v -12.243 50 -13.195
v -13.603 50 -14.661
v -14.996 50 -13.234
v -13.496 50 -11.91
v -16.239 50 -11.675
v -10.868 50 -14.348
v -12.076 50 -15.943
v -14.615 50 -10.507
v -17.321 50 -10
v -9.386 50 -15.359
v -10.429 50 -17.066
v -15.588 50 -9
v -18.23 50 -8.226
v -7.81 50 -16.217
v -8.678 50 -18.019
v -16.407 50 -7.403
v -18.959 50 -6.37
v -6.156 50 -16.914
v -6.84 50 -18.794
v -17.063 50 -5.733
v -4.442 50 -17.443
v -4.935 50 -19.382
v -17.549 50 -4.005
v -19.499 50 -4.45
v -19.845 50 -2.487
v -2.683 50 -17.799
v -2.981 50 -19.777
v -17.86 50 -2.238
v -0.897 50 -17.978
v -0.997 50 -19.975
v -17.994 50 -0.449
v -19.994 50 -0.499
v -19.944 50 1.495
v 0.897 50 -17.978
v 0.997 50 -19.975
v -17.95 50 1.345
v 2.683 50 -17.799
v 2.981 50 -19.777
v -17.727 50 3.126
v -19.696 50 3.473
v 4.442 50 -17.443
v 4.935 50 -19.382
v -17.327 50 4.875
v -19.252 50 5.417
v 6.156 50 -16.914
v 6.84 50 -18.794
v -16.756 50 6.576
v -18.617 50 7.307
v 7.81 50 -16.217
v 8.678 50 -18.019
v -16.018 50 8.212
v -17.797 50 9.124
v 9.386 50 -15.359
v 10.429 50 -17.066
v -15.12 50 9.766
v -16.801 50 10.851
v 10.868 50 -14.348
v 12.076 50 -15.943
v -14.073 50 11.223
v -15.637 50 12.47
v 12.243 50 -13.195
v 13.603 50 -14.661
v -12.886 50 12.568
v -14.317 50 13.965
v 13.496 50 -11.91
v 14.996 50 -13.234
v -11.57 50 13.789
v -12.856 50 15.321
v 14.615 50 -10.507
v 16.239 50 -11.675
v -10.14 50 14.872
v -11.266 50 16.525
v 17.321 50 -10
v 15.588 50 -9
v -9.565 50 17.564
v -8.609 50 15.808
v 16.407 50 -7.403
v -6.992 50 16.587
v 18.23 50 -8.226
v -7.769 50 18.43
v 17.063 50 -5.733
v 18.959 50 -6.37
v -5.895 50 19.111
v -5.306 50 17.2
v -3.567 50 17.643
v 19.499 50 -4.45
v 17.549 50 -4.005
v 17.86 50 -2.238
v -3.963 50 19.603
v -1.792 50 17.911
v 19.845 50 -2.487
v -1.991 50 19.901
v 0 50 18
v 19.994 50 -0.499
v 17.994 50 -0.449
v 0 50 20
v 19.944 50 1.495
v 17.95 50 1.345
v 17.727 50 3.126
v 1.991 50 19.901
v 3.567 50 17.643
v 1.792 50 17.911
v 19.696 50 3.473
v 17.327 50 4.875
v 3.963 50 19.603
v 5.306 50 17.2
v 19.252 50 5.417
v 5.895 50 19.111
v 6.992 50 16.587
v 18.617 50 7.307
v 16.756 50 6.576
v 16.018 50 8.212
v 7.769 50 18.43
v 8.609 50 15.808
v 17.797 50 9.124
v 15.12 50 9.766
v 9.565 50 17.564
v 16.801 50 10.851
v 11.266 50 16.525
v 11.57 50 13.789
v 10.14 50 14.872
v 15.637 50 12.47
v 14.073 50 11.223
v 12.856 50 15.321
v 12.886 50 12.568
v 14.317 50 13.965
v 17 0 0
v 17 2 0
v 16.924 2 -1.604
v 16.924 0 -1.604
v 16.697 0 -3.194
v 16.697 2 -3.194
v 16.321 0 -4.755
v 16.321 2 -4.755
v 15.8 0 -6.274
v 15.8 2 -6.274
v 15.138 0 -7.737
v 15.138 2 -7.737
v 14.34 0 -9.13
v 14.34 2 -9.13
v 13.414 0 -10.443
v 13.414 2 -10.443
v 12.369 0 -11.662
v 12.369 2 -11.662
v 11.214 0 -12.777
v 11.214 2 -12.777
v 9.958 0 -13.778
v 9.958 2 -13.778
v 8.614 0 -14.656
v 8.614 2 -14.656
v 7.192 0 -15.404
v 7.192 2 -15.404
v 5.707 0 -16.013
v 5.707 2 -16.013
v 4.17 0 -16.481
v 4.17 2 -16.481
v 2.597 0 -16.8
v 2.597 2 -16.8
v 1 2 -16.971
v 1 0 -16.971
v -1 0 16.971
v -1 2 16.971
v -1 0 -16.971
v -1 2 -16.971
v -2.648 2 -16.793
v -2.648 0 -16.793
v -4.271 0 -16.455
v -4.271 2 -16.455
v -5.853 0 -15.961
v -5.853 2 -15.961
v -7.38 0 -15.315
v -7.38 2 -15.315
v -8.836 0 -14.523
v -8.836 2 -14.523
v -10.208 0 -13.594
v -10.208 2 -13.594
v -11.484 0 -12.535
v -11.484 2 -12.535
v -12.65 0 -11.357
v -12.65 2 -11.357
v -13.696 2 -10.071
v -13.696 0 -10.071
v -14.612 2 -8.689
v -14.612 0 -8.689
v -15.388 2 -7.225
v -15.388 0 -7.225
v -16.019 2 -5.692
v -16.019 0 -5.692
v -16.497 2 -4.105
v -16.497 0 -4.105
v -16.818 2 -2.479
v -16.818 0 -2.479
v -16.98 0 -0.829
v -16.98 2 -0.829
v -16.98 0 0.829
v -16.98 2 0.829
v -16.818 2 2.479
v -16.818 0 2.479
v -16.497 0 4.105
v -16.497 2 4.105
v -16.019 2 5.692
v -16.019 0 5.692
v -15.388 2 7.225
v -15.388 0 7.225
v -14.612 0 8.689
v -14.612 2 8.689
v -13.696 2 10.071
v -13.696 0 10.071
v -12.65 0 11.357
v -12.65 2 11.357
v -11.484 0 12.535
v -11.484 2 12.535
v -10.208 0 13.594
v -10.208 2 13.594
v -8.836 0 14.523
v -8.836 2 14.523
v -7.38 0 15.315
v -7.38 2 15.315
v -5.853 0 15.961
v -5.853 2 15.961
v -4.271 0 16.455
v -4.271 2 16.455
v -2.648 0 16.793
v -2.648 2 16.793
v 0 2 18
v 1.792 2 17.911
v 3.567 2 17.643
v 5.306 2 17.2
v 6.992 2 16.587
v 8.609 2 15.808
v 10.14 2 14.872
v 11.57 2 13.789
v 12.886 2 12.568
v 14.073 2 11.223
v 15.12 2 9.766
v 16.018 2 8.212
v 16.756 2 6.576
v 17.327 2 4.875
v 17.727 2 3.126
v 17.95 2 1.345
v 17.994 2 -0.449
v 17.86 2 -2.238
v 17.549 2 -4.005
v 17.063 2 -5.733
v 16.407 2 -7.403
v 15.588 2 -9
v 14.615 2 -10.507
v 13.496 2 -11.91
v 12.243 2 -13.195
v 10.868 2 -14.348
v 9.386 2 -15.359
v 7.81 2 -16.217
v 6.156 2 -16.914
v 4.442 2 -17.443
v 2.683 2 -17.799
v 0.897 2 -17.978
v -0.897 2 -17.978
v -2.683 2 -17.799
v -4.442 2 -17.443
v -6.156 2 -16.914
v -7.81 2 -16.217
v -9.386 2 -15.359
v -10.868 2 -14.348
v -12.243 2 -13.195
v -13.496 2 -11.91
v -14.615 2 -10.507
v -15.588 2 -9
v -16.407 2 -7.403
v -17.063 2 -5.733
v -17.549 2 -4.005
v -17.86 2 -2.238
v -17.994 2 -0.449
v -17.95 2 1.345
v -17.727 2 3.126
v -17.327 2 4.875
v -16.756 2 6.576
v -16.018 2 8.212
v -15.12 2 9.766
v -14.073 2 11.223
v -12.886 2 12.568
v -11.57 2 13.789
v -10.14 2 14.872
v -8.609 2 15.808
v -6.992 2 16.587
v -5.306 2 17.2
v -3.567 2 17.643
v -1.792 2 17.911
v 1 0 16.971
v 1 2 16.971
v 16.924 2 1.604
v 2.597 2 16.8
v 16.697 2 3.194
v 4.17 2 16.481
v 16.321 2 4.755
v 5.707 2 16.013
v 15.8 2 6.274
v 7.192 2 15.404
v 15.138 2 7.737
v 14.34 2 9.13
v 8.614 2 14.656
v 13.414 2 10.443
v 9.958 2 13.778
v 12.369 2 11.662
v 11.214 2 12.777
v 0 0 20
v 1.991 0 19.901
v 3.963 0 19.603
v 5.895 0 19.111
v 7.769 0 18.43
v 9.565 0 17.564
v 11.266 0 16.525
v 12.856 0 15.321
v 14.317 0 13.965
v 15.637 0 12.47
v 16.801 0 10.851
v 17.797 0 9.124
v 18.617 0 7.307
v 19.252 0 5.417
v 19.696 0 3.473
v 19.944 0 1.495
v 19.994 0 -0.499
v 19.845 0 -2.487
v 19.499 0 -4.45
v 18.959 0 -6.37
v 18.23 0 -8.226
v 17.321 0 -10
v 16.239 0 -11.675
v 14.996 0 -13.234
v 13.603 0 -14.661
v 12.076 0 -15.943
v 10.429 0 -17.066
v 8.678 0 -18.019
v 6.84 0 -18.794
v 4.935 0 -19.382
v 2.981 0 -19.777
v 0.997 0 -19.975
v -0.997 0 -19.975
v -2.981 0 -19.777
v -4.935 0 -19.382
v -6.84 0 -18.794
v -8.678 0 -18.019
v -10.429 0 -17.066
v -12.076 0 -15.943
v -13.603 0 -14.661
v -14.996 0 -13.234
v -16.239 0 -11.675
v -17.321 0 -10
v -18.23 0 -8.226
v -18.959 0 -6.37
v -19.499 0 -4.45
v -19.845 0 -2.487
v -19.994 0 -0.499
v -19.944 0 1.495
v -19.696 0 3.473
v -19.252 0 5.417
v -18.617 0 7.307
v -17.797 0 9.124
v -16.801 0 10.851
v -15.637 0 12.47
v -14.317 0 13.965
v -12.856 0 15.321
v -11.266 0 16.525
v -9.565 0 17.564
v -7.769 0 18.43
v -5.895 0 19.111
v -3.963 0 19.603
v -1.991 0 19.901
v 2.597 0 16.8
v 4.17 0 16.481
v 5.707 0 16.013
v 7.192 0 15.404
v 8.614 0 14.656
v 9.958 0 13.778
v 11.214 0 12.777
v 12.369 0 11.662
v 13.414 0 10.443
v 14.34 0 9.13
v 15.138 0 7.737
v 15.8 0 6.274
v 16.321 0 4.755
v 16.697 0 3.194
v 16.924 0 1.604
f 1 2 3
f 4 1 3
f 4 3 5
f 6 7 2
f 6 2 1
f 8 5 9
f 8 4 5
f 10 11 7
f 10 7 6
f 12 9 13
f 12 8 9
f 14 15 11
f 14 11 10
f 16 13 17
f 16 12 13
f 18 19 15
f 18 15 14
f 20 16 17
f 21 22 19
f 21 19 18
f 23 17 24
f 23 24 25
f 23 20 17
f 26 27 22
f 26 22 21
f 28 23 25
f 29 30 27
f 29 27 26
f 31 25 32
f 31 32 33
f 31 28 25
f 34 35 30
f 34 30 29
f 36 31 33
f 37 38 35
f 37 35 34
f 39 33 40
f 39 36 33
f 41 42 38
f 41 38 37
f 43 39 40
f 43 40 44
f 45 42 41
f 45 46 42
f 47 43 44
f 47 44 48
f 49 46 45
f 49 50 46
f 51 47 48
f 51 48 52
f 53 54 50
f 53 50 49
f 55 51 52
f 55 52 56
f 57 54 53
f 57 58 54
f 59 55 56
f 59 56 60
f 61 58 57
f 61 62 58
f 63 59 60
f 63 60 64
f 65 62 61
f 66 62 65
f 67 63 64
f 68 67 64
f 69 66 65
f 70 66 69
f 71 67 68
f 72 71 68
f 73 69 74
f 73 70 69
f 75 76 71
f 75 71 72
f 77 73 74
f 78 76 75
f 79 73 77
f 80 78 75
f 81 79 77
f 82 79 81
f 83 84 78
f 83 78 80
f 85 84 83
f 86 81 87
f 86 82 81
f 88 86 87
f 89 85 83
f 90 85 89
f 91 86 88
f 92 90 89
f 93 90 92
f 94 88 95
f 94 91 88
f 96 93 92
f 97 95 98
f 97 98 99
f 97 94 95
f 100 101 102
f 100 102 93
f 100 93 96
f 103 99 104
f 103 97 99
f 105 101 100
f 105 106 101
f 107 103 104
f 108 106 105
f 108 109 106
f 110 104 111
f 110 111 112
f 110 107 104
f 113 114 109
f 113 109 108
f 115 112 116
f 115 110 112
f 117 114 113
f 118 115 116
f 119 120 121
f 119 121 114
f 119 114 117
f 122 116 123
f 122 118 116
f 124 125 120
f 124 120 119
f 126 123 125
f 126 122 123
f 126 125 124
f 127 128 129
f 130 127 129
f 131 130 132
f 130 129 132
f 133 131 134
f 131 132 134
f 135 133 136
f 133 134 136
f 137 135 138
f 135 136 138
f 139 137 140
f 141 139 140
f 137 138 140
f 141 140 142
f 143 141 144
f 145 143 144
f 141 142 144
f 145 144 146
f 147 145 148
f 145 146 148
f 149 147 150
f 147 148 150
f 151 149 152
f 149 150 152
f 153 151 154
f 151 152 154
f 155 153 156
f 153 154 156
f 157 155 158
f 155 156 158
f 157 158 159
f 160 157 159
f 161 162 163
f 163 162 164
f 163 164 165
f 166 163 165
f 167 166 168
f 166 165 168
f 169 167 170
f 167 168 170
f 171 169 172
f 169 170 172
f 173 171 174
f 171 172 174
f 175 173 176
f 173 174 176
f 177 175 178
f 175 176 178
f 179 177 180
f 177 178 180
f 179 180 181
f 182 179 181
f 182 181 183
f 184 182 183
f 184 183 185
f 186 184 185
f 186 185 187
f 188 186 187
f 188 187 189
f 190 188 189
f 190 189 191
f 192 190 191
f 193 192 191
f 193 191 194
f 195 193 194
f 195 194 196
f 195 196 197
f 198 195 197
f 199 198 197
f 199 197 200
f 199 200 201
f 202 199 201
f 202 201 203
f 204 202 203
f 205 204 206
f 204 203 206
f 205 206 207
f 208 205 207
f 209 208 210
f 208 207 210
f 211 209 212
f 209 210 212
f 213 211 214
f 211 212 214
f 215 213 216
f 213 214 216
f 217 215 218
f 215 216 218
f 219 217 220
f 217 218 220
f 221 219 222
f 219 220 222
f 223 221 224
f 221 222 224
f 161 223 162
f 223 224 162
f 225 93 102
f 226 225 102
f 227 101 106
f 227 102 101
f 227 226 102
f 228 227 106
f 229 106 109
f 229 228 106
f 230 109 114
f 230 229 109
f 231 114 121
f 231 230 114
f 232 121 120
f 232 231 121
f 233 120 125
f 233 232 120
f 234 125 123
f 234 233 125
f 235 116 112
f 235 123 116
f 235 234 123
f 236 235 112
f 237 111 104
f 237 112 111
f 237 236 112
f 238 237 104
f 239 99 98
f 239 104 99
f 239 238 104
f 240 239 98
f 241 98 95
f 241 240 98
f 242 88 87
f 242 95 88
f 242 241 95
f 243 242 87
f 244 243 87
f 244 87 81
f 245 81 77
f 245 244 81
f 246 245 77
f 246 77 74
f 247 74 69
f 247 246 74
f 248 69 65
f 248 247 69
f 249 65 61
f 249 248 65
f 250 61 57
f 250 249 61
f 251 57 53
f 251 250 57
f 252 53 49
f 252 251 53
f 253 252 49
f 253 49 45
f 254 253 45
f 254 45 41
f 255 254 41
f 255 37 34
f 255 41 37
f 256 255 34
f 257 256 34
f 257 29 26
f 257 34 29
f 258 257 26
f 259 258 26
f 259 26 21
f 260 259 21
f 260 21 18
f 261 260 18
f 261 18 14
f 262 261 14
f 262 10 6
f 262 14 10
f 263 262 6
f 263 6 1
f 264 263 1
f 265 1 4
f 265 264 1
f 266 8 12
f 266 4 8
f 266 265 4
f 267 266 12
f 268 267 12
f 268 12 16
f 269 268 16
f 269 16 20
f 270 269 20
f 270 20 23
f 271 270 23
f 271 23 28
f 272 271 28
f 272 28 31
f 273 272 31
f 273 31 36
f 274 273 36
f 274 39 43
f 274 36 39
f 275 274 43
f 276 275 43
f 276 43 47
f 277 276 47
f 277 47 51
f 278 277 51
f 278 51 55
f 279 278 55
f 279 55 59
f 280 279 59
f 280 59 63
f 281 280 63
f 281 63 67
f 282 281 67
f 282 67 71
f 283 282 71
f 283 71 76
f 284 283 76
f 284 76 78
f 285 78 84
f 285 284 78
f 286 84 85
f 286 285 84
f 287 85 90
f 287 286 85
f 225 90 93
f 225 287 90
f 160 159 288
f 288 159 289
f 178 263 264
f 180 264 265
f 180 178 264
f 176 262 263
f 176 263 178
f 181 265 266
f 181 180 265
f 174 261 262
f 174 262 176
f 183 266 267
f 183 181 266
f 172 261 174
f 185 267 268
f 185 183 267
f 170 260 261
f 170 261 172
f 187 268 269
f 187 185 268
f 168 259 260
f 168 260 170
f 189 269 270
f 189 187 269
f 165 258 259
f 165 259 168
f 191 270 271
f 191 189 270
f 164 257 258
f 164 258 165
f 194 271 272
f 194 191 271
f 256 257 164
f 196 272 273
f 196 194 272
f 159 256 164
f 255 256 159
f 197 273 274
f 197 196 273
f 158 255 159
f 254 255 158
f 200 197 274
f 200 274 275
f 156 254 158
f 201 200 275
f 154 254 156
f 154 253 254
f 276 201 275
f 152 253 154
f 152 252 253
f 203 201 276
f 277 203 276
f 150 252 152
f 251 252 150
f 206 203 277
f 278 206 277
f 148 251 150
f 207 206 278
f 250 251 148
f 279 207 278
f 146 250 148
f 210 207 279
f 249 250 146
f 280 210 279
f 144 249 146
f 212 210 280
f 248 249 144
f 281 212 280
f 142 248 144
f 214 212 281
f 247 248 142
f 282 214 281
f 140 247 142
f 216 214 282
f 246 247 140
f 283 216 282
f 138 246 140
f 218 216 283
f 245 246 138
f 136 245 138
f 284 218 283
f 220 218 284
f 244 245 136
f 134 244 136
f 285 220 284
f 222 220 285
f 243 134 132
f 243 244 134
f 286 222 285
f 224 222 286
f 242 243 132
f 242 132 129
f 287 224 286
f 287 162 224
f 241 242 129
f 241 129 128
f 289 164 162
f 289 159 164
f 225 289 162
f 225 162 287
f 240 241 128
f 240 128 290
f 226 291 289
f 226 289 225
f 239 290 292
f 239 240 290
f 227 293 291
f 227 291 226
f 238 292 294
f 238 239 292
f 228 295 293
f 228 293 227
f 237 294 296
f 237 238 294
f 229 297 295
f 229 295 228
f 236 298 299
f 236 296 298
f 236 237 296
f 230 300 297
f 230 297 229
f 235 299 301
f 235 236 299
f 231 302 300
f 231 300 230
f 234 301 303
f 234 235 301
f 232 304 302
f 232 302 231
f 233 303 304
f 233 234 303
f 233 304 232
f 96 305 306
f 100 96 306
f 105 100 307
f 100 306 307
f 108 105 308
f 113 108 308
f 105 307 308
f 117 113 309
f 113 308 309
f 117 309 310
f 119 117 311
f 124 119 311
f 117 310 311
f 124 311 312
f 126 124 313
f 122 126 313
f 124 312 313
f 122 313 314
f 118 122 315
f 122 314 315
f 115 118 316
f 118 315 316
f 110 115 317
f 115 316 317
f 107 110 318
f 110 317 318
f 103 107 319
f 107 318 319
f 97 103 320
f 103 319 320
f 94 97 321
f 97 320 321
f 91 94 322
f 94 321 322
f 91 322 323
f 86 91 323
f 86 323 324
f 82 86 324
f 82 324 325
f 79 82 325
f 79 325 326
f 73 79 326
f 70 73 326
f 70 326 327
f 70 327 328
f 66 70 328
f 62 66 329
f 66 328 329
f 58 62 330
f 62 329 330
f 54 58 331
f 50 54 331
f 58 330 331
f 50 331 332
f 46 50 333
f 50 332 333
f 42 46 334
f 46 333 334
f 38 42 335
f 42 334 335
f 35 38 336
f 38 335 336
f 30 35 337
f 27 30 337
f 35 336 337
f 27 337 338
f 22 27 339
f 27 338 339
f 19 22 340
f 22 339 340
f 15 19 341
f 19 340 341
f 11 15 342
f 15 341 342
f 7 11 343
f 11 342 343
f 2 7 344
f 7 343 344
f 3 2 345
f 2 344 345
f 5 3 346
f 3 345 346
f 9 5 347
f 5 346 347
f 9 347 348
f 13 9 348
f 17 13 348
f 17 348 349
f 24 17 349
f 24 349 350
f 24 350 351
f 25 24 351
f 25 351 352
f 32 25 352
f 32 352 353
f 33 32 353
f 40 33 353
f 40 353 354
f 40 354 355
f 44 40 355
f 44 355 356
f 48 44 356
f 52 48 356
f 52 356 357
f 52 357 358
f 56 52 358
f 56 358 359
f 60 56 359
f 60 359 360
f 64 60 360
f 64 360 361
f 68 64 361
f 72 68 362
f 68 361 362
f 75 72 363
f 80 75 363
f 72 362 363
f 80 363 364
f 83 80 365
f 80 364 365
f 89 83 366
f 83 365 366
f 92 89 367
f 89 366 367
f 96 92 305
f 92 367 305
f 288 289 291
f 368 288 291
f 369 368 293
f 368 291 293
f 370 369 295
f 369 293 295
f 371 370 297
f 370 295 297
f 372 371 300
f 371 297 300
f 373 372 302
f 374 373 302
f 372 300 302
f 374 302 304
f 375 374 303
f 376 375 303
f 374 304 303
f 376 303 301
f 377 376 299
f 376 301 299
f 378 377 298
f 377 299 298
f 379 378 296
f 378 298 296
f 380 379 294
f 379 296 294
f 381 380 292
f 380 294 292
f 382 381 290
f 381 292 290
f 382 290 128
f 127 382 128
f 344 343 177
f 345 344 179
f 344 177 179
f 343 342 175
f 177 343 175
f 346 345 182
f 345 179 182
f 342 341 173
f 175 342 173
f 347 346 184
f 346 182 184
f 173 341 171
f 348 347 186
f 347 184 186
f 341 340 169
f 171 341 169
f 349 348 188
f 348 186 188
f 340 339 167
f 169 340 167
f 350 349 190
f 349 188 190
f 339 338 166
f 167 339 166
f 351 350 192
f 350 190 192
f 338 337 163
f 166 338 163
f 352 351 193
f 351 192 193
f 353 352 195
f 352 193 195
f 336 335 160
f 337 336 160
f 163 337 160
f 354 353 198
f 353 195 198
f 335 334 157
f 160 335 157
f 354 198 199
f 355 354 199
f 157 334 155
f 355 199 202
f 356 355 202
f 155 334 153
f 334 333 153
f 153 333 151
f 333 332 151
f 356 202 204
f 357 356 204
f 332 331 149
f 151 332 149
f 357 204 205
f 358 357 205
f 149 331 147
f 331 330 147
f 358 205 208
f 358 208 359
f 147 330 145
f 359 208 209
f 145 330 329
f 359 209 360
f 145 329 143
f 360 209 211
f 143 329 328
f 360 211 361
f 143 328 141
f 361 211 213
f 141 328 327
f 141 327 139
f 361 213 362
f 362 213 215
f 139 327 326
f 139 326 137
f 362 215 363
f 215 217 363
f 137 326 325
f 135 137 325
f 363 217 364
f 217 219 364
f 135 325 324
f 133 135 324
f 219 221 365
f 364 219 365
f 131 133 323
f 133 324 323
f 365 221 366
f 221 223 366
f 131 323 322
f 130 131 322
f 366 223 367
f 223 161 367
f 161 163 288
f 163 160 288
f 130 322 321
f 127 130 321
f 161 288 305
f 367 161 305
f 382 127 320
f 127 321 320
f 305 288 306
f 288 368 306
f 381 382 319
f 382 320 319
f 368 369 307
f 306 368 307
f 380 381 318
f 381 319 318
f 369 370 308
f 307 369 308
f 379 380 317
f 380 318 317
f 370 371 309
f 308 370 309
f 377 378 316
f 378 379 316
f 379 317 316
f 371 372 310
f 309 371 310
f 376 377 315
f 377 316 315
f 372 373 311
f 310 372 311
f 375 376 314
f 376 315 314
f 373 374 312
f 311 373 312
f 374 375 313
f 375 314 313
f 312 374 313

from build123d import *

# Parameters (mm, degrees)
SKETCH1_R           = 20
BOSS_EXTRUDE1_DEPTH = 50
SHELL3_T            = -2
CUT_EXTRUDE1_DEPTH  = 50


with BuildPart() as part:
    # Sketch1 → Boss-Extrude1 (new body)
    with BuildSketch(Plane(origin=(0, 0, 0), x_dir=(1, 0, 0), z_dir=(0, 1, 0))):
        with Locations(Location((0, 0, 0), (0, 0, 270))):
            Circle(SKETCH1_R)
    extrude(amount=BOSS_EXTRUDE1_DEPTH)

    # Shell3
    shell3_openings = [part.faces().sort_by_distance(p)[0] for p in [
        (0, 50, 0),
    ]]
    offset(amount=SHELL3_T, openings=shell3_openings, kind=Kind.INTERSECTION)

    # Sketch2 → Cut-Extrude1 (cut)
    with BuildSketch(Plane(origin=(0, 2, 0), x_dir=(1, 0, 0), z_dir=(0, 1, 0))):
        with BuildLine():
            Line((-1, -16.970562748), (-1, 16.970562748))
            ThreePointArc((-1, 16.970562748), (-17, 0), (-1, -16.970562748))
        make_face()
        with BuildLine():
            ThreePointArc((17, 0), (12.369316877, 11.66190379), (1, 16.970562748))
            Line((1, 16.970562748), (1, -16.970562748))
            ThreePointArc((1, -16.970562748), (12.369316877, -11.66190379), (17, 0))
        make_face()
    extrude(amount=-CUT_EXTRUDE1_DEPTH, mode=Mode.SUBTRACT)


solid = part.part
